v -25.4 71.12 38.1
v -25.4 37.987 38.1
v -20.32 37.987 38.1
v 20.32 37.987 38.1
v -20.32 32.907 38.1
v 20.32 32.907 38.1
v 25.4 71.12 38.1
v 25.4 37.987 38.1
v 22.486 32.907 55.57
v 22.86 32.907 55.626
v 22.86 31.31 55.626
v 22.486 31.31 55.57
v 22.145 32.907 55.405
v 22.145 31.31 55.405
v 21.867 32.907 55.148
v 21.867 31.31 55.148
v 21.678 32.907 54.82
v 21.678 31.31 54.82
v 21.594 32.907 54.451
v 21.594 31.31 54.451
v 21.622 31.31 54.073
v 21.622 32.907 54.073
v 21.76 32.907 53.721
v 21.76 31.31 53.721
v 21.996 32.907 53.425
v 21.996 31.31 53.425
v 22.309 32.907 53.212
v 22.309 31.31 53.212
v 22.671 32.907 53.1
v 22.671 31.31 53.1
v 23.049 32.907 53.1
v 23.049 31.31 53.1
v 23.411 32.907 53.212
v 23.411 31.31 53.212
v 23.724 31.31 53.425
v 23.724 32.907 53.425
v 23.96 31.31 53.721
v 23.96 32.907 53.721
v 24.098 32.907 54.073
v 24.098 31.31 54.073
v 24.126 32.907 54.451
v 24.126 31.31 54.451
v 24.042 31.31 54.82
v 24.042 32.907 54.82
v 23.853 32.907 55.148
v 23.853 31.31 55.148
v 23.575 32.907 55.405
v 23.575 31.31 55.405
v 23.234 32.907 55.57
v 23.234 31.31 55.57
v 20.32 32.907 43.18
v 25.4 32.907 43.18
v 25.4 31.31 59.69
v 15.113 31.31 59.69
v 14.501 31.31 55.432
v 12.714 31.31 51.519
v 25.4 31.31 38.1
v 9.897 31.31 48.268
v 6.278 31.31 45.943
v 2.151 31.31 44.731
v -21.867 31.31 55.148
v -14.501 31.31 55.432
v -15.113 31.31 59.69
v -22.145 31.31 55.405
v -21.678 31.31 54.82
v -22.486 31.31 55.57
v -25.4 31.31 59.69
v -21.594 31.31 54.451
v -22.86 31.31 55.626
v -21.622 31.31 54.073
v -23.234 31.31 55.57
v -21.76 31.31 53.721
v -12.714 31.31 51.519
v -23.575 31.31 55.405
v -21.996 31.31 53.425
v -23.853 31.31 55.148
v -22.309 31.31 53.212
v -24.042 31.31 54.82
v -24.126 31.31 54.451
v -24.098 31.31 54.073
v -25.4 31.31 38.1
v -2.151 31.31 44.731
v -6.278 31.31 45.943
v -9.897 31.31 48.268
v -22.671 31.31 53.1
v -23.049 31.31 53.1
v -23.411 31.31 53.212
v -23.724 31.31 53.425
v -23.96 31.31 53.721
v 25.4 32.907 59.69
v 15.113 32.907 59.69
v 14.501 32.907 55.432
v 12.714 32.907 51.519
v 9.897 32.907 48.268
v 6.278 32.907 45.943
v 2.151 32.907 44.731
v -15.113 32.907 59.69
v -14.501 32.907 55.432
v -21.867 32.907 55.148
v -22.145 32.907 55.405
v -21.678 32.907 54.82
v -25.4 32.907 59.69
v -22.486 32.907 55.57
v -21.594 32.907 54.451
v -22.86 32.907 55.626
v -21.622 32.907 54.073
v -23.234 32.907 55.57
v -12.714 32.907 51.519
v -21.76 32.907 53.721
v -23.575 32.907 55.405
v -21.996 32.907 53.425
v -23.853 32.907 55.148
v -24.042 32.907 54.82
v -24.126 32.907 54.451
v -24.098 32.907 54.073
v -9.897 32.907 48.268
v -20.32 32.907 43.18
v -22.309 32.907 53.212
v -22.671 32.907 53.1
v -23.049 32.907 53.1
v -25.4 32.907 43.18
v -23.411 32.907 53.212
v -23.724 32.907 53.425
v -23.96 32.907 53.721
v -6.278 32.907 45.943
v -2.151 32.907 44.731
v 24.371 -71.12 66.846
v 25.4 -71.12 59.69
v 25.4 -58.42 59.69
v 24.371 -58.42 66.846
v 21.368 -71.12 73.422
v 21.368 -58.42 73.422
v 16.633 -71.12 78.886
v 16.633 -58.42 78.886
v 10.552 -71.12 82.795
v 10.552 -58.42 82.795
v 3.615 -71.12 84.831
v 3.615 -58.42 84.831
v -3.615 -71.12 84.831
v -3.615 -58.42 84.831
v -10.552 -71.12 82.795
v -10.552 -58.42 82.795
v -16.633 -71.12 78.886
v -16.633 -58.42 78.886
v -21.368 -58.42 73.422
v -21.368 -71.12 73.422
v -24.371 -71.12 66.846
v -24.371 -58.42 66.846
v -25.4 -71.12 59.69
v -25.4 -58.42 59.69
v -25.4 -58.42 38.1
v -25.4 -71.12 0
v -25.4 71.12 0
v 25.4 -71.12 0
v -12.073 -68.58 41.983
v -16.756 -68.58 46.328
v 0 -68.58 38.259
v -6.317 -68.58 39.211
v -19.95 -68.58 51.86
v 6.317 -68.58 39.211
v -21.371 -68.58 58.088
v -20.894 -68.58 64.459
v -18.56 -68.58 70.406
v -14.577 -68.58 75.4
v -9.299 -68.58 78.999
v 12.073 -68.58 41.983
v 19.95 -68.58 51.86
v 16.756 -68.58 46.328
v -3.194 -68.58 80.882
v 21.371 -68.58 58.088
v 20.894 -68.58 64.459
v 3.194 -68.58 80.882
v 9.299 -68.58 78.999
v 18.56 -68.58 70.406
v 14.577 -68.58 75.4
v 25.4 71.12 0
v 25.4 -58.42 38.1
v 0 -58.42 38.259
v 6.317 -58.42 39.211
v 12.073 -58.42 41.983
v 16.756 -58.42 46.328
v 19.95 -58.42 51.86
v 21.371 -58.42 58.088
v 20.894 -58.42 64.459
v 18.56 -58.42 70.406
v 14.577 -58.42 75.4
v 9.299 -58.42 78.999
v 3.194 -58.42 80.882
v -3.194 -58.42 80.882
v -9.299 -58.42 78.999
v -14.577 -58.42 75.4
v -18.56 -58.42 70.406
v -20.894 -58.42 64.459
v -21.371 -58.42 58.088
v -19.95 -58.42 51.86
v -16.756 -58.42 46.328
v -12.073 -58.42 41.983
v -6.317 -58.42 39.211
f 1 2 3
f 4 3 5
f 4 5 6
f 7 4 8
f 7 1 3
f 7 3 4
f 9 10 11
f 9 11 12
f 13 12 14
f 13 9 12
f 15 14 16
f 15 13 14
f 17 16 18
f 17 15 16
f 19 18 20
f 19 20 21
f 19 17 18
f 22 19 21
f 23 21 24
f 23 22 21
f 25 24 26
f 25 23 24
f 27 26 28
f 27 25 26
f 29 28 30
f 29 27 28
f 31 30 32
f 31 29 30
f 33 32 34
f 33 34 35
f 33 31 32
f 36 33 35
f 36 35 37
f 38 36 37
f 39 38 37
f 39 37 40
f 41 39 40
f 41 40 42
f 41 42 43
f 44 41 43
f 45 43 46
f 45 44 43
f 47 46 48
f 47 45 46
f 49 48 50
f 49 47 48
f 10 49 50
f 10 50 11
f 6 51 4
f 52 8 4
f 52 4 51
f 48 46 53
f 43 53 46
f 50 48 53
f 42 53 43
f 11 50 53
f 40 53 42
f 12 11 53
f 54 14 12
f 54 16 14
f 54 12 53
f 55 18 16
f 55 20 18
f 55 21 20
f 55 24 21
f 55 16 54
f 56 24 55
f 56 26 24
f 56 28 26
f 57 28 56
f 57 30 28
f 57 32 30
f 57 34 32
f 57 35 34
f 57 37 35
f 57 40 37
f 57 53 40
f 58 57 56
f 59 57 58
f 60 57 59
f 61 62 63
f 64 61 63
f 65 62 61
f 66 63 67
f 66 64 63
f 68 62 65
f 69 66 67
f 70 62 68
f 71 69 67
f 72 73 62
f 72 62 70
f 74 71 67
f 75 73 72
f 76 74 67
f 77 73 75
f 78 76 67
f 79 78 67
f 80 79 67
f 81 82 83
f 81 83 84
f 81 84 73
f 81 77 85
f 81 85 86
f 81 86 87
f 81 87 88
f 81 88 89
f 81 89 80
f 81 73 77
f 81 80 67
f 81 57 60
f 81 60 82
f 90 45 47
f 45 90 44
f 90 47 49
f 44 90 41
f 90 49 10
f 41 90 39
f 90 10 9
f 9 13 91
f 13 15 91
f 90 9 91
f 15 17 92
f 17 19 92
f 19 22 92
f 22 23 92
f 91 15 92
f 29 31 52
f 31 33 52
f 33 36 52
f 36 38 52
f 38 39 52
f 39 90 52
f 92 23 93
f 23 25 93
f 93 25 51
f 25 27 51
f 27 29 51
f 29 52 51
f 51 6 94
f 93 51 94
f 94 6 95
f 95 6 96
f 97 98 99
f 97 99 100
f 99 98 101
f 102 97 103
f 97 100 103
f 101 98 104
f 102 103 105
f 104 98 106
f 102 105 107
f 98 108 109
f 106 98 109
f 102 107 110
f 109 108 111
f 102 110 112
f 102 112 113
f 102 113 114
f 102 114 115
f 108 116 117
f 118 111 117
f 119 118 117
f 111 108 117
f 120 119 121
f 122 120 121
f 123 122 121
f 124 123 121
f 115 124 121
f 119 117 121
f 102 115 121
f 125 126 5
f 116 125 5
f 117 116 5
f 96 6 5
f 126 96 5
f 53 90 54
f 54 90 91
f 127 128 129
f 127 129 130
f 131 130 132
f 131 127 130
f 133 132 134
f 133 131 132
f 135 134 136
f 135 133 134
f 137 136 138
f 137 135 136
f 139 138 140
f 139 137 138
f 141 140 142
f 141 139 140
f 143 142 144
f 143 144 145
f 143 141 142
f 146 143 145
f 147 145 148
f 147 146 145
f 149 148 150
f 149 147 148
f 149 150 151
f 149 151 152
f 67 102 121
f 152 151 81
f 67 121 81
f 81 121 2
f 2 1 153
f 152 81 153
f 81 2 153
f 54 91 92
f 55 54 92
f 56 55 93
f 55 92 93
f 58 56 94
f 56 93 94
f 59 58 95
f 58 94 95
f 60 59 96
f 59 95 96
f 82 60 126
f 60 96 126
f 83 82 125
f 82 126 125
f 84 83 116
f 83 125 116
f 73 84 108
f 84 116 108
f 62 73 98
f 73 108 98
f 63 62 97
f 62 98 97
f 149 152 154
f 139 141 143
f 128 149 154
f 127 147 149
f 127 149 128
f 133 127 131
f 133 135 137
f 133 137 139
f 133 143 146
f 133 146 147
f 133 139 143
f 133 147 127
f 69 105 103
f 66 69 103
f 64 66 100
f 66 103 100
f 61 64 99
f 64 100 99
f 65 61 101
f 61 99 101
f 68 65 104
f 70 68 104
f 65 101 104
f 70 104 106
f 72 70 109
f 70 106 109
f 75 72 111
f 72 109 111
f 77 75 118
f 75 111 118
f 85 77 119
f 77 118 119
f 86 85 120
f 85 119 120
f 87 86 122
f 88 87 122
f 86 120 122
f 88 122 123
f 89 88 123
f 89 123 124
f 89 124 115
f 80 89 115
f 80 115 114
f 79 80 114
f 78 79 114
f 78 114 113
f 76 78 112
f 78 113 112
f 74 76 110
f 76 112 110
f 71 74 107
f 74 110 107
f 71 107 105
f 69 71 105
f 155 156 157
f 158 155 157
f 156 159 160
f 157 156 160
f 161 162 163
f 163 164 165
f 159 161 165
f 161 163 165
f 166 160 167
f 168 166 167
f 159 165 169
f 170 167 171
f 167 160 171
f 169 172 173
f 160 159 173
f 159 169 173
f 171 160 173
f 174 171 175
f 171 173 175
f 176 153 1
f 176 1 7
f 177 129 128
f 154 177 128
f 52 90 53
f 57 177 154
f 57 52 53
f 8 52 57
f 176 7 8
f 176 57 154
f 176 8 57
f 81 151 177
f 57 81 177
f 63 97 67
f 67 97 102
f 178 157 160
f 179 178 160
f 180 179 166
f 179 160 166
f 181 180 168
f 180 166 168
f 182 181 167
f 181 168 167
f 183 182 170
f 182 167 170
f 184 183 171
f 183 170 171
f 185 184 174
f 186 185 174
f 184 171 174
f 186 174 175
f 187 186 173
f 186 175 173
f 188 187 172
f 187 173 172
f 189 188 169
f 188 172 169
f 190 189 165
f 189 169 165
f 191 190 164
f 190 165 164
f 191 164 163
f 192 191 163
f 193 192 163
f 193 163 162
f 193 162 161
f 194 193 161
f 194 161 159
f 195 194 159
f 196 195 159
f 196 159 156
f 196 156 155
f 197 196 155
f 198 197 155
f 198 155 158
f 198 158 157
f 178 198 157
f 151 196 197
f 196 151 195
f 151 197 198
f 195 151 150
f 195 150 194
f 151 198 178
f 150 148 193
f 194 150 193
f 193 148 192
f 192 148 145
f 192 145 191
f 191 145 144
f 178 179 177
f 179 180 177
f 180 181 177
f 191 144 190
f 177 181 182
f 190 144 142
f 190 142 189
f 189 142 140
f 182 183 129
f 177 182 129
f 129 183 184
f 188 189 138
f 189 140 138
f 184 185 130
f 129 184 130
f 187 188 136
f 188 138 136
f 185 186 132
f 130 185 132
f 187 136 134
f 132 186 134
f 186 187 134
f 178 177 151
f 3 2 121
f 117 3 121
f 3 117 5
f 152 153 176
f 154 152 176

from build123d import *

# Parameters (mm, degrees)
SKETCH1_W            = 50.8
SKETCH1_H            = 142.24
BOSS_EXTRUDE1_DEPTH  = 38.1
SKETCH8_R            = 21.43125
BOSS_EXTRUDE2_DEPTH  = 2.54
SKETCH8_5_R          = 21.43125
BOSS_EXTRUDE9_DEPTH  = 12.7
BOSS_EXTRUDE13_DEPTH = 0.798558565
SKETCH16_R           = 1.27
CUT_EXTRUDE7_DEPTH   = 1.59711713
BOSS_EXTRUDE14_DEPTH = 5.08


with BuildPart() as part:
    # Sketch1 → Boss-Extrude1 (new body)
    with BuildSketch(Plane.XY):
        Rectangle(SKETCH1_W, SKETCH1_H)
    extrude(amount=BOSS_EXTRUDE1_DEPTH)



with BuildPart() as body_2:
    # Sketch8 → Boss-Extrude2 (new body)
    # profile 1 of 2: a face of its own
    with BuildSketch(Plane.XZ.offset(71.12)):
        with BuildLine():
            Line((-25.4, 38.1), (25.4, 38.1))
            Line((25.4, 38.1), (25.4, 59.69))
            ThreePointArc((25.4, 59.69), (0, 85.09), (-25.4, 59.69))
            Line((-25.4, 59.69), (-25.4, 38.1))
        make_face()
        with Locations((0, 59.69)):
            Circle(SKETCH8_R, mode=Mode.SUBTRACT)
    # profile 2 of 2: a face of its own
    with BuildSketch(Plane.XZ.offset(71.12)):
        with Locations((0, 59.69)):
            Circle(SKETCH8_R)
    extrude(amount=-BOSS_EXTRUDE2_DEPTH)


with BuildPart() as part_1:
    add(part.part)

    add(body_2.part)  # Boss-Extrude9 merges body 2
    # Sketch8<5> → Boss-Extrude9 (add)
    with BuildSketch(Plane.XZ.offset(71.12)):
        with BuildLine():
            Line((25.4, 38.1), (25.4, 59.69))
            ThreePointArc((25.4, 59.69), (0, 85.09), (-25.4, 59.69))
            Line((-25.4, 59.69), (-25.4, 38.1))
            Line((-25.4, 38.1), (25.4, 38.1))
        make_face()
        with Locations(Location((0, 59.69, 0), (0, 0, 270))):
            Circle(SKETCH8_5_R, mode=Mode.SUBTRACT)
    extrude(amount=-BOSS_EXTRUDE9_DEPTH)

    # Sketch15 → Boss-Extrude13 (add, symmetric)
    with BuildSketch(Plane(origin=(0, 32.108355434, 0), x_dir=(1, 0, 0), z_dir=(0, 1, 0))):
        with BuildLine():
            Line((-15.113, -59.69), (-25.4, -59.69))
            Line((-25.4, -59.69), (-25.4, -38.1))
            Line((-25.4, -38.1), (25.4, -38.1))
            Line((25.4, -38.1), (25.4, -59.69))
            Line((25.4, -59.69), (15.113, -59.69))
            ThreePointArc((15.113, -59.69), (0, -44.577), (-15.113, -59.69))
        make_face()
    extrude(amount=BOSS_EXTRUDE13_DEPTH, both=True)

    # Sketch16 → Cut-Extrude7 (cut)
    with BuildSketch(Plane(origin=(0, 32.906913999, 0), x_dir=(1, 0, 0), z_dir=(0, 1, 0))):
        with Locations(Location((-22.86, -54.356, 0), (0, 0, 270))):
            Circle(SKETCH16_R)
    cut_extrude7 = extrude(amount=-CUT_EXTRUDE7_DEPTH, mode=Mode.SUBTRACT)

    # Mirror1: Cut-Extrude7 across plane
    add(cut_extrude7.mirror(Plane(origin=(0, 0, 0), x_dir=(0, 0, 1), z_dir=(1, 0, 0))), mode=Mode.SUBTRACT)

    # Sketch17 → Boss-Extrude14 (add)
    with BuildSketch(Plane(origin=(25.4, 0, 0), x_dir=(0, 0, -1), z_dir=(1, 0, 0))):
        Polygon((-38.1, 32.906913999), (-38.1, 37.986913999), (-43.18, 32.906913999), align=None)
    boss_extrude14 = extrude(amount=-BOSS_EXTRUDE14_DEPTH)

    # Mirror2: Boss-Extrude14 across plane
    add(boss_extrude14.mirror(Plane(origin=(0, 0, 0), x_dir=(0, 0, 1), z_dir=(1, 0, 0))))


solid = part_1.part
